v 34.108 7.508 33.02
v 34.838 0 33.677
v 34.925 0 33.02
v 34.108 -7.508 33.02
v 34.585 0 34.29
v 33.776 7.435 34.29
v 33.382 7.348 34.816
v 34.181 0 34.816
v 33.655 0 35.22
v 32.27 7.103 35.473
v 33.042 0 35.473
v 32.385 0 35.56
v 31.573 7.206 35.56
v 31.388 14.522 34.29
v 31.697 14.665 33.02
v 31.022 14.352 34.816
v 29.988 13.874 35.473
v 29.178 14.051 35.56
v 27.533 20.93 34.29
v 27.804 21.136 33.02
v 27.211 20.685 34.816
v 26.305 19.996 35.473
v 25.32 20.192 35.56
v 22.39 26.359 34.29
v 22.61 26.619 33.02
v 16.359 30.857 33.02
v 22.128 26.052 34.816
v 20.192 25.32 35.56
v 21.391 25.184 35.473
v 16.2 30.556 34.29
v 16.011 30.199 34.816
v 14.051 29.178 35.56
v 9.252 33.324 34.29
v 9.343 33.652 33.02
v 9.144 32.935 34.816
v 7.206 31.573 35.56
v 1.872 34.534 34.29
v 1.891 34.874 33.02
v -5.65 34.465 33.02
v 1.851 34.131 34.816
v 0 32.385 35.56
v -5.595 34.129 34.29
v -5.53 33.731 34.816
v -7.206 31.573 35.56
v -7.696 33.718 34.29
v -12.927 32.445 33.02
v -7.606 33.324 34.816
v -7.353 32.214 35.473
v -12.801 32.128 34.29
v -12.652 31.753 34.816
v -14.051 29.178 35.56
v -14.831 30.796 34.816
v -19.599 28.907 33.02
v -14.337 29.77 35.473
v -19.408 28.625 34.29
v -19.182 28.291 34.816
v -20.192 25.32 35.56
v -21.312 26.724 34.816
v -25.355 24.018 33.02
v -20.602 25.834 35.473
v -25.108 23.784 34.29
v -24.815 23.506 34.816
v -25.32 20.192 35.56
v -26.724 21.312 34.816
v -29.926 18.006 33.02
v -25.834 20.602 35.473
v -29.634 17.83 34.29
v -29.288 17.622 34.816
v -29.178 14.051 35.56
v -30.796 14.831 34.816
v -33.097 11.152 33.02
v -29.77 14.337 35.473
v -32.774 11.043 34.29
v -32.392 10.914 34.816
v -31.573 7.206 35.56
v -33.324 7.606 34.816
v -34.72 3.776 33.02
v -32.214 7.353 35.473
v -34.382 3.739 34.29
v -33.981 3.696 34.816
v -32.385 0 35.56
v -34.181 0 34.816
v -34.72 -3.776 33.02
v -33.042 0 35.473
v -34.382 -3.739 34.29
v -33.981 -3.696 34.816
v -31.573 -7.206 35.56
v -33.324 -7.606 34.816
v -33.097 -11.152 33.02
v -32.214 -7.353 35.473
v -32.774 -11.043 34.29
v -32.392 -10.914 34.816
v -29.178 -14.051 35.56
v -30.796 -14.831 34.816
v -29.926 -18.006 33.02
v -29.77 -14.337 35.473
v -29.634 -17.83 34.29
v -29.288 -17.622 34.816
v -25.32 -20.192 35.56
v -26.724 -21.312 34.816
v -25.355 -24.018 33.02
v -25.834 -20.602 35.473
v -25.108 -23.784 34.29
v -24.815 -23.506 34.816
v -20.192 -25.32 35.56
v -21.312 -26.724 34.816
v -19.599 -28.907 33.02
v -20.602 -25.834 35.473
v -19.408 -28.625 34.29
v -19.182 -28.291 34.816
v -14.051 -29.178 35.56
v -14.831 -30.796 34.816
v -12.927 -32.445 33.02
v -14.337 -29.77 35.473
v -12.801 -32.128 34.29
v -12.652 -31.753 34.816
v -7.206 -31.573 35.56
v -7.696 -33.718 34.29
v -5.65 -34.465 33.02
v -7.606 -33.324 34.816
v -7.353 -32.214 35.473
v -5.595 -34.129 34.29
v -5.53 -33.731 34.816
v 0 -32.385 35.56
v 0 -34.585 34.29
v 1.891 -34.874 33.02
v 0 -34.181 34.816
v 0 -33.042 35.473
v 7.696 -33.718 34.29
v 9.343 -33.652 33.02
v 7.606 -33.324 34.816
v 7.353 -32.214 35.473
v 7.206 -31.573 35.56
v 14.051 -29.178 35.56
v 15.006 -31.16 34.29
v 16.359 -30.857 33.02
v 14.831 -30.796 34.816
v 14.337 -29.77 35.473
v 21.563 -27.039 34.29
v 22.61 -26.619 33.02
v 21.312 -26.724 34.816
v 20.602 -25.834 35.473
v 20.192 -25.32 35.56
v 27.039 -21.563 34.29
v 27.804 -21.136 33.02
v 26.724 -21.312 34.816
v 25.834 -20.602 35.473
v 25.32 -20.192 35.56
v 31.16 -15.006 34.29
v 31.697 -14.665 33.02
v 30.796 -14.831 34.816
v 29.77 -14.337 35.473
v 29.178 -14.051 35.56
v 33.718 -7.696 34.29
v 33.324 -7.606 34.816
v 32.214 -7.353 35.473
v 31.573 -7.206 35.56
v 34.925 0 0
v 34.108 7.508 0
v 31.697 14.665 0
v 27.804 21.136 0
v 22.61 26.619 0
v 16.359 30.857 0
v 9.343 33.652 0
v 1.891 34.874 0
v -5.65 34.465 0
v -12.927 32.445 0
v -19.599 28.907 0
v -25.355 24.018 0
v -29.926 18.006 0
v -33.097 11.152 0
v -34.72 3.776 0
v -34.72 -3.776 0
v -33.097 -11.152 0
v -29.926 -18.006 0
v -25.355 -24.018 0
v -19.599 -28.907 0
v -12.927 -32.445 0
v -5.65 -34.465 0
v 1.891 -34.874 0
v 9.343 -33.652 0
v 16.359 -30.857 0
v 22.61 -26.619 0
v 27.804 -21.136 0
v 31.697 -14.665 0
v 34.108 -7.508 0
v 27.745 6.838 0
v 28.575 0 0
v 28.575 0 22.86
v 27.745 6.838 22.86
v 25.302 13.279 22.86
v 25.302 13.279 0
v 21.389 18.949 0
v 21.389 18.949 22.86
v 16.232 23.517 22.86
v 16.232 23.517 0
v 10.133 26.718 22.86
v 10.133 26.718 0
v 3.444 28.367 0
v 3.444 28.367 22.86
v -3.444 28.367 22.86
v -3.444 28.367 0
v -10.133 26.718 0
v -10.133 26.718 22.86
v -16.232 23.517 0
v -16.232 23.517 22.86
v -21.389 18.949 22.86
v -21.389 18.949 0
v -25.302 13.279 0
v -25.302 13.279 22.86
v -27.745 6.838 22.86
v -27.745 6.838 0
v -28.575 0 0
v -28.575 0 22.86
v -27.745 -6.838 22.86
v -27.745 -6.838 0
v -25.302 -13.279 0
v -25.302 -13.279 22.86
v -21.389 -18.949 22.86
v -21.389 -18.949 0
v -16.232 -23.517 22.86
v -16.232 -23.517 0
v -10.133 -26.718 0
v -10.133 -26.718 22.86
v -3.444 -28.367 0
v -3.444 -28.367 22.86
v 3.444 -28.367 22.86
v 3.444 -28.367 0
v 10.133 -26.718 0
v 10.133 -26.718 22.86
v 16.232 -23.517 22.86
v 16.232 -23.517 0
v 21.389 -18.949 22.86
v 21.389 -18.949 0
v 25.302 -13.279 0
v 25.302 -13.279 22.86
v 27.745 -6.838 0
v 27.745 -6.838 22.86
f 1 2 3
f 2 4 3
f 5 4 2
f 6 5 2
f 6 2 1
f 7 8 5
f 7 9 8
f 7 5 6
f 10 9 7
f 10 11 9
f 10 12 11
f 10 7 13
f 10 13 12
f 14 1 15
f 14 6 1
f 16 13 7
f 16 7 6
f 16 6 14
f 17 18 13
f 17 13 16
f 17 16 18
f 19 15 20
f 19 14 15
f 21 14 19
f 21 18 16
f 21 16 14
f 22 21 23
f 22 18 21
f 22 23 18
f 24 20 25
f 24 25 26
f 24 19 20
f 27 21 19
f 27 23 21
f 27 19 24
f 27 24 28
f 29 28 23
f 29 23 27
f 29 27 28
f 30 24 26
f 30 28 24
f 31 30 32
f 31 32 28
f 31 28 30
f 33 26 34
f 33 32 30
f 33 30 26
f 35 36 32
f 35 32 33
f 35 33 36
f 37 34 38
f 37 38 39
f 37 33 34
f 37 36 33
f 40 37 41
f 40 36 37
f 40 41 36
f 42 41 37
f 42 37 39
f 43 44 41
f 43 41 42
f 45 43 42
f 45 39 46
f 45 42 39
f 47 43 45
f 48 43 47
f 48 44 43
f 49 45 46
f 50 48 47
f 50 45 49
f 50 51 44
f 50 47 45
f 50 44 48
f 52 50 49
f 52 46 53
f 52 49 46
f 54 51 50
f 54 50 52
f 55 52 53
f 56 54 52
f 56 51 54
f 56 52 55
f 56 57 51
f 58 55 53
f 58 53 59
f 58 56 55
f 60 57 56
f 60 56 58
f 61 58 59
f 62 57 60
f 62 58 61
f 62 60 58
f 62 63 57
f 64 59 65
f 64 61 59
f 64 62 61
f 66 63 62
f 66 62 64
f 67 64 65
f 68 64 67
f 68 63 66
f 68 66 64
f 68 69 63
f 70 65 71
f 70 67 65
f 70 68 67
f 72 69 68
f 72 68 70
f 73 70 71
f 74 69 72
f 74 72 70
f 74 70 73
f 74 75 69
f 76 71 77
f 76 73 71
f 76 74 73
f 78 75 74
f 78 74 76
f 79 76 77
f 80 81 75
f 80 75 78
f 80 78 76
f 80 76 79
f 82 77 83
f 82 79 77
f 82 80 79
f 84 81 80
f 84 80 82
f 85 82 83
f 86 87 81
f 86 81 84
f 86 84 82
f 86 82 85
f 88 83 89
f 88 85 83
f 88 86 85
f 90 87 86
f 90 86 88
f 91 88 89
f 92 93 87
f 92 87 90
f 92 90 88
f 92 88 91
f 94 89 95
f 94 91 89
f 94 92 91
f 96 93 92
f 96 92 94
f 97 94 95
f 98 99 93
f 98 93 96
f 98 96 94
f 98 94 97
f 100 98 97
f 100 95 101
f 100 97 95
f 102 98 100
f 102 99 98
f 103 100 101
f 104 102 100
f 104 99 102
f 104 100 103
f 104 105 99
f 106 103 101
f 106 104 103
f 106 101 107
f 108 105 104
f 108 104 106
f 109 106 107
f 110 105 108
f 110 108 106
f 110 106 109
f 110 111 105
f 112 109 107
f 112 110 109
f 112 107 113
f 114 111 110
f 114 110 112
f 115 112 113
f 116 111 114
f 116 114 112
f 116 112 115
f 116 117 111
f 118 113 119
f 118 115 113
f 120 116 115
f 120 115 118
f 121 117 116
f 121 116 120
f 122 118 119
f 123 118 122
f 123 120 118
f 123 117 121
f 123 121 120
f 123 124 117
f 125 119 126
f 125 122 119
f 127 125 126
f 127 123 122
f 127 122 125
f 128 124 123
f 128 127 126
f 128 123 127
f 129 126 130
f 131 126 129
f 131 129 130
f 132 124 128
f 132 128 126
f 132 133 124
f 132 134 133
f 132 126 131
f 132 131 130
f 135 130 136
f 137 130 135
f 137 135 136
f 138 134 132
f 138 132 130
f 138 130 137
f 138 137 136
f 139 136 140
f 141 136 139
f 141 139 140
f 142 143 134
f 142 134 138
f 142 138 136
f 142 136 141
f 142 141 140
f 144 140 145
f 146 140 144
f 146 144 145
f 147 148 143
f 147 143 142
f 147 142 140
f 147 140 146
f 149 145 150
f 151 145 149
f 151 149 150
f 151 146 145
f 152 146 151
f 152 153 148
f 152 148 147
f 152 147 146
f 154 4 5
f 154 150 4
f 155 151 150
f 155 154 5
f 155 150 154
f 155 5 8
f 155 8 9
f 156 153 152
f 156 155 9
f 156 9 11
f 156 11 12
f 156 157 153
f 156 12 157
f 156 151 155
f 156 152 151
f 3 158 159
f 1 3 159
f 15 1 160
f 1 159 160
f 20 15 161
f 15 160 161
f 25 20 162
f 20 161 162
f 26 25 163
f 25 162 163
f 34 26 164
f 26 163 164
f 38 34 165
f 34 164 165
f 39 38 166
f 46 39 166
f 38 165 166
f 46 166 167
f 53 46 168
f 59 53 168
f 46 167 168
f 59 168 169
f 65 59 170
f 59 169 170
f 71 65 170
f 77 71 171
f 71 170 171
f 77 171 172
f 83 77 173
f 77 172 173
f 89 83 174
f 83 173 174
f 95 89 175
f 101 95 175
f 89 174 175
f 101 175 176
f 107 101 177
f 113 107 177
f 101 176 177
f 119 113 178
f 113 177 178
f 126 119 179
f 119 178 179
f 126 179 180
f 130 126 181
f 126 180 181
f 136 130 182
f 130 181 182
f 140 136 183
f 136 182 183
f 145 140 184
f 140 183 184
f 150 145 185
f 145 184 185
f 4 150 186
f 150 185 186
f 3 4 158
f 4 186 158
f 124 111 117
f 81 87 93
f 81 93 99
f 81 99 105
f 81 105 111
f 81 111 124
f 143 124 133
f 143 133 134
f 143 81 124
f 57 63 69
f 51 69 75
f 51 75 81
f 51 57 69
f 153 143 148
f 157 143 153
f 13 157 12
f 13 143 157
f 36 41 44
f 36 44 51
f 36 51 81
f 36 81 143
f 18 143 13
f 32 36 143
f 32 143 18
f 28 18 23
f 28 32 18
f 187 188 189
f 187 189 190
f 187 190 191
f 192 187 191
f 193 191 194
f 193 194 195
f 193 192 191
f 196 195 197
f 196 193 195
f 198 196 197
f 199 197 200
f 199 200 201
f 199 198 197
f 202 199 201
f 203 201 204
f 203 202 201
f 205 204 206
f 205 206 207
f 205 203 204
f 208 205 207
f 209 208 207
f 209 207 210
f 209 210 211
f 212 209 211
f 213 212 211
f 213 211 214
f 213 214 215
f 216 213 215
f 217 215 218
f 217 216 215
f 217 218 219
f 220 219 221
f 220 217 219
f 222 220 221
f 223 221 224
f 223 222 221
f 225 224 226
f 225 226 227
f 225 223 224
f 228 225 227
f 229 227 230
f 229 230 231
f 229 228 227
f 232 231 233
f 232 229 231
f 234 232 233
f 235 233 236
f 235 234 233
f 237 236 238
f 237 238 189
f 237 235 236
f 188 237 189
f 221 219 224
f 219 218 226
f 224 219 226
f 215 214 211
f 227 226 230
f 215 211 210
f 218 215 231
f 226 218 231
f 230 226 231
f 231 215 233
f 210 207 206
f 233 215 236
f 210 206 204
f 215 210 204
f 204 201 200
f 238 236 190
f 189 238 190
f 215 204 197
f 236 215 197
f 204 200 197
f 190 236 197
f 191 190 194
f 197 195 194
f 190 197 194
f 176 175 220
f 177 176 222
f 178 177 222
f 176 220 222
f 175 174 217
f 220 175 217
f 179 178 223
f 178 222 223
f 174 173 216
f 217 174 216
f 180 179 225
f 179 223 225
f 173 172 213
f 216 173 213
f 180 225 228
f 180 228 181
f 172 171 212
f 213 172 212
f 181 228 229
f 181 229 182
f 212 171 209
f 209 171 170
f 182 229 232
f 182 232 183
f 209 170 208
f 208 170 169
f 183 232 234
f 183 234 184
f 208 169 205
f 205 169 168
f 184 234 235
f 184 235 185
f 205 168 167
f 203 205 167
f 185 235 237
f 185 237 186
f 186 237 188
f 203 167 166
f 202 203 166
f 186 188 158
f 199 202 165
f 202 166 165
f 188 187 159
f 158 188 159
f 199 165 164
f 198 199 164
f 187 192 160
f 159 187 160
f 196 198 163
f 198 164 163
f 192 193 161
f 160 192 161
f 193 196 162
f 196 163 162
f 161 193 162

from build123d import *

# Parameters (mm, degrees)
F1_R     = 34.925
F2_DEPTH = 35.56
F3_R     = 2.54
F4_R     = 28.575
F5_DEPTH = 22.86


with BuildPart() as f2:
    # F1 (on face) → F2 (new body)
    with BuildSketch(Plane.XY):
        Circle(F1_R)
    extrude(amount=F2_DEPTH)

    # F3
    f3_edges = [f2.edges().sort_by_distance(p)[0] for p in [
        (-34.925, 0, 35.56),
    ]]
    fillet(f3_edges, radius=F3_R)

    # F4 (on Top) → F5 (cut)
    with BuildSketch(Plane.XY):
        Circle(F4_R)
    extrude(amount=F5_DEPTH, mode=Mode.SUBTRACT)


solid = f2.part
